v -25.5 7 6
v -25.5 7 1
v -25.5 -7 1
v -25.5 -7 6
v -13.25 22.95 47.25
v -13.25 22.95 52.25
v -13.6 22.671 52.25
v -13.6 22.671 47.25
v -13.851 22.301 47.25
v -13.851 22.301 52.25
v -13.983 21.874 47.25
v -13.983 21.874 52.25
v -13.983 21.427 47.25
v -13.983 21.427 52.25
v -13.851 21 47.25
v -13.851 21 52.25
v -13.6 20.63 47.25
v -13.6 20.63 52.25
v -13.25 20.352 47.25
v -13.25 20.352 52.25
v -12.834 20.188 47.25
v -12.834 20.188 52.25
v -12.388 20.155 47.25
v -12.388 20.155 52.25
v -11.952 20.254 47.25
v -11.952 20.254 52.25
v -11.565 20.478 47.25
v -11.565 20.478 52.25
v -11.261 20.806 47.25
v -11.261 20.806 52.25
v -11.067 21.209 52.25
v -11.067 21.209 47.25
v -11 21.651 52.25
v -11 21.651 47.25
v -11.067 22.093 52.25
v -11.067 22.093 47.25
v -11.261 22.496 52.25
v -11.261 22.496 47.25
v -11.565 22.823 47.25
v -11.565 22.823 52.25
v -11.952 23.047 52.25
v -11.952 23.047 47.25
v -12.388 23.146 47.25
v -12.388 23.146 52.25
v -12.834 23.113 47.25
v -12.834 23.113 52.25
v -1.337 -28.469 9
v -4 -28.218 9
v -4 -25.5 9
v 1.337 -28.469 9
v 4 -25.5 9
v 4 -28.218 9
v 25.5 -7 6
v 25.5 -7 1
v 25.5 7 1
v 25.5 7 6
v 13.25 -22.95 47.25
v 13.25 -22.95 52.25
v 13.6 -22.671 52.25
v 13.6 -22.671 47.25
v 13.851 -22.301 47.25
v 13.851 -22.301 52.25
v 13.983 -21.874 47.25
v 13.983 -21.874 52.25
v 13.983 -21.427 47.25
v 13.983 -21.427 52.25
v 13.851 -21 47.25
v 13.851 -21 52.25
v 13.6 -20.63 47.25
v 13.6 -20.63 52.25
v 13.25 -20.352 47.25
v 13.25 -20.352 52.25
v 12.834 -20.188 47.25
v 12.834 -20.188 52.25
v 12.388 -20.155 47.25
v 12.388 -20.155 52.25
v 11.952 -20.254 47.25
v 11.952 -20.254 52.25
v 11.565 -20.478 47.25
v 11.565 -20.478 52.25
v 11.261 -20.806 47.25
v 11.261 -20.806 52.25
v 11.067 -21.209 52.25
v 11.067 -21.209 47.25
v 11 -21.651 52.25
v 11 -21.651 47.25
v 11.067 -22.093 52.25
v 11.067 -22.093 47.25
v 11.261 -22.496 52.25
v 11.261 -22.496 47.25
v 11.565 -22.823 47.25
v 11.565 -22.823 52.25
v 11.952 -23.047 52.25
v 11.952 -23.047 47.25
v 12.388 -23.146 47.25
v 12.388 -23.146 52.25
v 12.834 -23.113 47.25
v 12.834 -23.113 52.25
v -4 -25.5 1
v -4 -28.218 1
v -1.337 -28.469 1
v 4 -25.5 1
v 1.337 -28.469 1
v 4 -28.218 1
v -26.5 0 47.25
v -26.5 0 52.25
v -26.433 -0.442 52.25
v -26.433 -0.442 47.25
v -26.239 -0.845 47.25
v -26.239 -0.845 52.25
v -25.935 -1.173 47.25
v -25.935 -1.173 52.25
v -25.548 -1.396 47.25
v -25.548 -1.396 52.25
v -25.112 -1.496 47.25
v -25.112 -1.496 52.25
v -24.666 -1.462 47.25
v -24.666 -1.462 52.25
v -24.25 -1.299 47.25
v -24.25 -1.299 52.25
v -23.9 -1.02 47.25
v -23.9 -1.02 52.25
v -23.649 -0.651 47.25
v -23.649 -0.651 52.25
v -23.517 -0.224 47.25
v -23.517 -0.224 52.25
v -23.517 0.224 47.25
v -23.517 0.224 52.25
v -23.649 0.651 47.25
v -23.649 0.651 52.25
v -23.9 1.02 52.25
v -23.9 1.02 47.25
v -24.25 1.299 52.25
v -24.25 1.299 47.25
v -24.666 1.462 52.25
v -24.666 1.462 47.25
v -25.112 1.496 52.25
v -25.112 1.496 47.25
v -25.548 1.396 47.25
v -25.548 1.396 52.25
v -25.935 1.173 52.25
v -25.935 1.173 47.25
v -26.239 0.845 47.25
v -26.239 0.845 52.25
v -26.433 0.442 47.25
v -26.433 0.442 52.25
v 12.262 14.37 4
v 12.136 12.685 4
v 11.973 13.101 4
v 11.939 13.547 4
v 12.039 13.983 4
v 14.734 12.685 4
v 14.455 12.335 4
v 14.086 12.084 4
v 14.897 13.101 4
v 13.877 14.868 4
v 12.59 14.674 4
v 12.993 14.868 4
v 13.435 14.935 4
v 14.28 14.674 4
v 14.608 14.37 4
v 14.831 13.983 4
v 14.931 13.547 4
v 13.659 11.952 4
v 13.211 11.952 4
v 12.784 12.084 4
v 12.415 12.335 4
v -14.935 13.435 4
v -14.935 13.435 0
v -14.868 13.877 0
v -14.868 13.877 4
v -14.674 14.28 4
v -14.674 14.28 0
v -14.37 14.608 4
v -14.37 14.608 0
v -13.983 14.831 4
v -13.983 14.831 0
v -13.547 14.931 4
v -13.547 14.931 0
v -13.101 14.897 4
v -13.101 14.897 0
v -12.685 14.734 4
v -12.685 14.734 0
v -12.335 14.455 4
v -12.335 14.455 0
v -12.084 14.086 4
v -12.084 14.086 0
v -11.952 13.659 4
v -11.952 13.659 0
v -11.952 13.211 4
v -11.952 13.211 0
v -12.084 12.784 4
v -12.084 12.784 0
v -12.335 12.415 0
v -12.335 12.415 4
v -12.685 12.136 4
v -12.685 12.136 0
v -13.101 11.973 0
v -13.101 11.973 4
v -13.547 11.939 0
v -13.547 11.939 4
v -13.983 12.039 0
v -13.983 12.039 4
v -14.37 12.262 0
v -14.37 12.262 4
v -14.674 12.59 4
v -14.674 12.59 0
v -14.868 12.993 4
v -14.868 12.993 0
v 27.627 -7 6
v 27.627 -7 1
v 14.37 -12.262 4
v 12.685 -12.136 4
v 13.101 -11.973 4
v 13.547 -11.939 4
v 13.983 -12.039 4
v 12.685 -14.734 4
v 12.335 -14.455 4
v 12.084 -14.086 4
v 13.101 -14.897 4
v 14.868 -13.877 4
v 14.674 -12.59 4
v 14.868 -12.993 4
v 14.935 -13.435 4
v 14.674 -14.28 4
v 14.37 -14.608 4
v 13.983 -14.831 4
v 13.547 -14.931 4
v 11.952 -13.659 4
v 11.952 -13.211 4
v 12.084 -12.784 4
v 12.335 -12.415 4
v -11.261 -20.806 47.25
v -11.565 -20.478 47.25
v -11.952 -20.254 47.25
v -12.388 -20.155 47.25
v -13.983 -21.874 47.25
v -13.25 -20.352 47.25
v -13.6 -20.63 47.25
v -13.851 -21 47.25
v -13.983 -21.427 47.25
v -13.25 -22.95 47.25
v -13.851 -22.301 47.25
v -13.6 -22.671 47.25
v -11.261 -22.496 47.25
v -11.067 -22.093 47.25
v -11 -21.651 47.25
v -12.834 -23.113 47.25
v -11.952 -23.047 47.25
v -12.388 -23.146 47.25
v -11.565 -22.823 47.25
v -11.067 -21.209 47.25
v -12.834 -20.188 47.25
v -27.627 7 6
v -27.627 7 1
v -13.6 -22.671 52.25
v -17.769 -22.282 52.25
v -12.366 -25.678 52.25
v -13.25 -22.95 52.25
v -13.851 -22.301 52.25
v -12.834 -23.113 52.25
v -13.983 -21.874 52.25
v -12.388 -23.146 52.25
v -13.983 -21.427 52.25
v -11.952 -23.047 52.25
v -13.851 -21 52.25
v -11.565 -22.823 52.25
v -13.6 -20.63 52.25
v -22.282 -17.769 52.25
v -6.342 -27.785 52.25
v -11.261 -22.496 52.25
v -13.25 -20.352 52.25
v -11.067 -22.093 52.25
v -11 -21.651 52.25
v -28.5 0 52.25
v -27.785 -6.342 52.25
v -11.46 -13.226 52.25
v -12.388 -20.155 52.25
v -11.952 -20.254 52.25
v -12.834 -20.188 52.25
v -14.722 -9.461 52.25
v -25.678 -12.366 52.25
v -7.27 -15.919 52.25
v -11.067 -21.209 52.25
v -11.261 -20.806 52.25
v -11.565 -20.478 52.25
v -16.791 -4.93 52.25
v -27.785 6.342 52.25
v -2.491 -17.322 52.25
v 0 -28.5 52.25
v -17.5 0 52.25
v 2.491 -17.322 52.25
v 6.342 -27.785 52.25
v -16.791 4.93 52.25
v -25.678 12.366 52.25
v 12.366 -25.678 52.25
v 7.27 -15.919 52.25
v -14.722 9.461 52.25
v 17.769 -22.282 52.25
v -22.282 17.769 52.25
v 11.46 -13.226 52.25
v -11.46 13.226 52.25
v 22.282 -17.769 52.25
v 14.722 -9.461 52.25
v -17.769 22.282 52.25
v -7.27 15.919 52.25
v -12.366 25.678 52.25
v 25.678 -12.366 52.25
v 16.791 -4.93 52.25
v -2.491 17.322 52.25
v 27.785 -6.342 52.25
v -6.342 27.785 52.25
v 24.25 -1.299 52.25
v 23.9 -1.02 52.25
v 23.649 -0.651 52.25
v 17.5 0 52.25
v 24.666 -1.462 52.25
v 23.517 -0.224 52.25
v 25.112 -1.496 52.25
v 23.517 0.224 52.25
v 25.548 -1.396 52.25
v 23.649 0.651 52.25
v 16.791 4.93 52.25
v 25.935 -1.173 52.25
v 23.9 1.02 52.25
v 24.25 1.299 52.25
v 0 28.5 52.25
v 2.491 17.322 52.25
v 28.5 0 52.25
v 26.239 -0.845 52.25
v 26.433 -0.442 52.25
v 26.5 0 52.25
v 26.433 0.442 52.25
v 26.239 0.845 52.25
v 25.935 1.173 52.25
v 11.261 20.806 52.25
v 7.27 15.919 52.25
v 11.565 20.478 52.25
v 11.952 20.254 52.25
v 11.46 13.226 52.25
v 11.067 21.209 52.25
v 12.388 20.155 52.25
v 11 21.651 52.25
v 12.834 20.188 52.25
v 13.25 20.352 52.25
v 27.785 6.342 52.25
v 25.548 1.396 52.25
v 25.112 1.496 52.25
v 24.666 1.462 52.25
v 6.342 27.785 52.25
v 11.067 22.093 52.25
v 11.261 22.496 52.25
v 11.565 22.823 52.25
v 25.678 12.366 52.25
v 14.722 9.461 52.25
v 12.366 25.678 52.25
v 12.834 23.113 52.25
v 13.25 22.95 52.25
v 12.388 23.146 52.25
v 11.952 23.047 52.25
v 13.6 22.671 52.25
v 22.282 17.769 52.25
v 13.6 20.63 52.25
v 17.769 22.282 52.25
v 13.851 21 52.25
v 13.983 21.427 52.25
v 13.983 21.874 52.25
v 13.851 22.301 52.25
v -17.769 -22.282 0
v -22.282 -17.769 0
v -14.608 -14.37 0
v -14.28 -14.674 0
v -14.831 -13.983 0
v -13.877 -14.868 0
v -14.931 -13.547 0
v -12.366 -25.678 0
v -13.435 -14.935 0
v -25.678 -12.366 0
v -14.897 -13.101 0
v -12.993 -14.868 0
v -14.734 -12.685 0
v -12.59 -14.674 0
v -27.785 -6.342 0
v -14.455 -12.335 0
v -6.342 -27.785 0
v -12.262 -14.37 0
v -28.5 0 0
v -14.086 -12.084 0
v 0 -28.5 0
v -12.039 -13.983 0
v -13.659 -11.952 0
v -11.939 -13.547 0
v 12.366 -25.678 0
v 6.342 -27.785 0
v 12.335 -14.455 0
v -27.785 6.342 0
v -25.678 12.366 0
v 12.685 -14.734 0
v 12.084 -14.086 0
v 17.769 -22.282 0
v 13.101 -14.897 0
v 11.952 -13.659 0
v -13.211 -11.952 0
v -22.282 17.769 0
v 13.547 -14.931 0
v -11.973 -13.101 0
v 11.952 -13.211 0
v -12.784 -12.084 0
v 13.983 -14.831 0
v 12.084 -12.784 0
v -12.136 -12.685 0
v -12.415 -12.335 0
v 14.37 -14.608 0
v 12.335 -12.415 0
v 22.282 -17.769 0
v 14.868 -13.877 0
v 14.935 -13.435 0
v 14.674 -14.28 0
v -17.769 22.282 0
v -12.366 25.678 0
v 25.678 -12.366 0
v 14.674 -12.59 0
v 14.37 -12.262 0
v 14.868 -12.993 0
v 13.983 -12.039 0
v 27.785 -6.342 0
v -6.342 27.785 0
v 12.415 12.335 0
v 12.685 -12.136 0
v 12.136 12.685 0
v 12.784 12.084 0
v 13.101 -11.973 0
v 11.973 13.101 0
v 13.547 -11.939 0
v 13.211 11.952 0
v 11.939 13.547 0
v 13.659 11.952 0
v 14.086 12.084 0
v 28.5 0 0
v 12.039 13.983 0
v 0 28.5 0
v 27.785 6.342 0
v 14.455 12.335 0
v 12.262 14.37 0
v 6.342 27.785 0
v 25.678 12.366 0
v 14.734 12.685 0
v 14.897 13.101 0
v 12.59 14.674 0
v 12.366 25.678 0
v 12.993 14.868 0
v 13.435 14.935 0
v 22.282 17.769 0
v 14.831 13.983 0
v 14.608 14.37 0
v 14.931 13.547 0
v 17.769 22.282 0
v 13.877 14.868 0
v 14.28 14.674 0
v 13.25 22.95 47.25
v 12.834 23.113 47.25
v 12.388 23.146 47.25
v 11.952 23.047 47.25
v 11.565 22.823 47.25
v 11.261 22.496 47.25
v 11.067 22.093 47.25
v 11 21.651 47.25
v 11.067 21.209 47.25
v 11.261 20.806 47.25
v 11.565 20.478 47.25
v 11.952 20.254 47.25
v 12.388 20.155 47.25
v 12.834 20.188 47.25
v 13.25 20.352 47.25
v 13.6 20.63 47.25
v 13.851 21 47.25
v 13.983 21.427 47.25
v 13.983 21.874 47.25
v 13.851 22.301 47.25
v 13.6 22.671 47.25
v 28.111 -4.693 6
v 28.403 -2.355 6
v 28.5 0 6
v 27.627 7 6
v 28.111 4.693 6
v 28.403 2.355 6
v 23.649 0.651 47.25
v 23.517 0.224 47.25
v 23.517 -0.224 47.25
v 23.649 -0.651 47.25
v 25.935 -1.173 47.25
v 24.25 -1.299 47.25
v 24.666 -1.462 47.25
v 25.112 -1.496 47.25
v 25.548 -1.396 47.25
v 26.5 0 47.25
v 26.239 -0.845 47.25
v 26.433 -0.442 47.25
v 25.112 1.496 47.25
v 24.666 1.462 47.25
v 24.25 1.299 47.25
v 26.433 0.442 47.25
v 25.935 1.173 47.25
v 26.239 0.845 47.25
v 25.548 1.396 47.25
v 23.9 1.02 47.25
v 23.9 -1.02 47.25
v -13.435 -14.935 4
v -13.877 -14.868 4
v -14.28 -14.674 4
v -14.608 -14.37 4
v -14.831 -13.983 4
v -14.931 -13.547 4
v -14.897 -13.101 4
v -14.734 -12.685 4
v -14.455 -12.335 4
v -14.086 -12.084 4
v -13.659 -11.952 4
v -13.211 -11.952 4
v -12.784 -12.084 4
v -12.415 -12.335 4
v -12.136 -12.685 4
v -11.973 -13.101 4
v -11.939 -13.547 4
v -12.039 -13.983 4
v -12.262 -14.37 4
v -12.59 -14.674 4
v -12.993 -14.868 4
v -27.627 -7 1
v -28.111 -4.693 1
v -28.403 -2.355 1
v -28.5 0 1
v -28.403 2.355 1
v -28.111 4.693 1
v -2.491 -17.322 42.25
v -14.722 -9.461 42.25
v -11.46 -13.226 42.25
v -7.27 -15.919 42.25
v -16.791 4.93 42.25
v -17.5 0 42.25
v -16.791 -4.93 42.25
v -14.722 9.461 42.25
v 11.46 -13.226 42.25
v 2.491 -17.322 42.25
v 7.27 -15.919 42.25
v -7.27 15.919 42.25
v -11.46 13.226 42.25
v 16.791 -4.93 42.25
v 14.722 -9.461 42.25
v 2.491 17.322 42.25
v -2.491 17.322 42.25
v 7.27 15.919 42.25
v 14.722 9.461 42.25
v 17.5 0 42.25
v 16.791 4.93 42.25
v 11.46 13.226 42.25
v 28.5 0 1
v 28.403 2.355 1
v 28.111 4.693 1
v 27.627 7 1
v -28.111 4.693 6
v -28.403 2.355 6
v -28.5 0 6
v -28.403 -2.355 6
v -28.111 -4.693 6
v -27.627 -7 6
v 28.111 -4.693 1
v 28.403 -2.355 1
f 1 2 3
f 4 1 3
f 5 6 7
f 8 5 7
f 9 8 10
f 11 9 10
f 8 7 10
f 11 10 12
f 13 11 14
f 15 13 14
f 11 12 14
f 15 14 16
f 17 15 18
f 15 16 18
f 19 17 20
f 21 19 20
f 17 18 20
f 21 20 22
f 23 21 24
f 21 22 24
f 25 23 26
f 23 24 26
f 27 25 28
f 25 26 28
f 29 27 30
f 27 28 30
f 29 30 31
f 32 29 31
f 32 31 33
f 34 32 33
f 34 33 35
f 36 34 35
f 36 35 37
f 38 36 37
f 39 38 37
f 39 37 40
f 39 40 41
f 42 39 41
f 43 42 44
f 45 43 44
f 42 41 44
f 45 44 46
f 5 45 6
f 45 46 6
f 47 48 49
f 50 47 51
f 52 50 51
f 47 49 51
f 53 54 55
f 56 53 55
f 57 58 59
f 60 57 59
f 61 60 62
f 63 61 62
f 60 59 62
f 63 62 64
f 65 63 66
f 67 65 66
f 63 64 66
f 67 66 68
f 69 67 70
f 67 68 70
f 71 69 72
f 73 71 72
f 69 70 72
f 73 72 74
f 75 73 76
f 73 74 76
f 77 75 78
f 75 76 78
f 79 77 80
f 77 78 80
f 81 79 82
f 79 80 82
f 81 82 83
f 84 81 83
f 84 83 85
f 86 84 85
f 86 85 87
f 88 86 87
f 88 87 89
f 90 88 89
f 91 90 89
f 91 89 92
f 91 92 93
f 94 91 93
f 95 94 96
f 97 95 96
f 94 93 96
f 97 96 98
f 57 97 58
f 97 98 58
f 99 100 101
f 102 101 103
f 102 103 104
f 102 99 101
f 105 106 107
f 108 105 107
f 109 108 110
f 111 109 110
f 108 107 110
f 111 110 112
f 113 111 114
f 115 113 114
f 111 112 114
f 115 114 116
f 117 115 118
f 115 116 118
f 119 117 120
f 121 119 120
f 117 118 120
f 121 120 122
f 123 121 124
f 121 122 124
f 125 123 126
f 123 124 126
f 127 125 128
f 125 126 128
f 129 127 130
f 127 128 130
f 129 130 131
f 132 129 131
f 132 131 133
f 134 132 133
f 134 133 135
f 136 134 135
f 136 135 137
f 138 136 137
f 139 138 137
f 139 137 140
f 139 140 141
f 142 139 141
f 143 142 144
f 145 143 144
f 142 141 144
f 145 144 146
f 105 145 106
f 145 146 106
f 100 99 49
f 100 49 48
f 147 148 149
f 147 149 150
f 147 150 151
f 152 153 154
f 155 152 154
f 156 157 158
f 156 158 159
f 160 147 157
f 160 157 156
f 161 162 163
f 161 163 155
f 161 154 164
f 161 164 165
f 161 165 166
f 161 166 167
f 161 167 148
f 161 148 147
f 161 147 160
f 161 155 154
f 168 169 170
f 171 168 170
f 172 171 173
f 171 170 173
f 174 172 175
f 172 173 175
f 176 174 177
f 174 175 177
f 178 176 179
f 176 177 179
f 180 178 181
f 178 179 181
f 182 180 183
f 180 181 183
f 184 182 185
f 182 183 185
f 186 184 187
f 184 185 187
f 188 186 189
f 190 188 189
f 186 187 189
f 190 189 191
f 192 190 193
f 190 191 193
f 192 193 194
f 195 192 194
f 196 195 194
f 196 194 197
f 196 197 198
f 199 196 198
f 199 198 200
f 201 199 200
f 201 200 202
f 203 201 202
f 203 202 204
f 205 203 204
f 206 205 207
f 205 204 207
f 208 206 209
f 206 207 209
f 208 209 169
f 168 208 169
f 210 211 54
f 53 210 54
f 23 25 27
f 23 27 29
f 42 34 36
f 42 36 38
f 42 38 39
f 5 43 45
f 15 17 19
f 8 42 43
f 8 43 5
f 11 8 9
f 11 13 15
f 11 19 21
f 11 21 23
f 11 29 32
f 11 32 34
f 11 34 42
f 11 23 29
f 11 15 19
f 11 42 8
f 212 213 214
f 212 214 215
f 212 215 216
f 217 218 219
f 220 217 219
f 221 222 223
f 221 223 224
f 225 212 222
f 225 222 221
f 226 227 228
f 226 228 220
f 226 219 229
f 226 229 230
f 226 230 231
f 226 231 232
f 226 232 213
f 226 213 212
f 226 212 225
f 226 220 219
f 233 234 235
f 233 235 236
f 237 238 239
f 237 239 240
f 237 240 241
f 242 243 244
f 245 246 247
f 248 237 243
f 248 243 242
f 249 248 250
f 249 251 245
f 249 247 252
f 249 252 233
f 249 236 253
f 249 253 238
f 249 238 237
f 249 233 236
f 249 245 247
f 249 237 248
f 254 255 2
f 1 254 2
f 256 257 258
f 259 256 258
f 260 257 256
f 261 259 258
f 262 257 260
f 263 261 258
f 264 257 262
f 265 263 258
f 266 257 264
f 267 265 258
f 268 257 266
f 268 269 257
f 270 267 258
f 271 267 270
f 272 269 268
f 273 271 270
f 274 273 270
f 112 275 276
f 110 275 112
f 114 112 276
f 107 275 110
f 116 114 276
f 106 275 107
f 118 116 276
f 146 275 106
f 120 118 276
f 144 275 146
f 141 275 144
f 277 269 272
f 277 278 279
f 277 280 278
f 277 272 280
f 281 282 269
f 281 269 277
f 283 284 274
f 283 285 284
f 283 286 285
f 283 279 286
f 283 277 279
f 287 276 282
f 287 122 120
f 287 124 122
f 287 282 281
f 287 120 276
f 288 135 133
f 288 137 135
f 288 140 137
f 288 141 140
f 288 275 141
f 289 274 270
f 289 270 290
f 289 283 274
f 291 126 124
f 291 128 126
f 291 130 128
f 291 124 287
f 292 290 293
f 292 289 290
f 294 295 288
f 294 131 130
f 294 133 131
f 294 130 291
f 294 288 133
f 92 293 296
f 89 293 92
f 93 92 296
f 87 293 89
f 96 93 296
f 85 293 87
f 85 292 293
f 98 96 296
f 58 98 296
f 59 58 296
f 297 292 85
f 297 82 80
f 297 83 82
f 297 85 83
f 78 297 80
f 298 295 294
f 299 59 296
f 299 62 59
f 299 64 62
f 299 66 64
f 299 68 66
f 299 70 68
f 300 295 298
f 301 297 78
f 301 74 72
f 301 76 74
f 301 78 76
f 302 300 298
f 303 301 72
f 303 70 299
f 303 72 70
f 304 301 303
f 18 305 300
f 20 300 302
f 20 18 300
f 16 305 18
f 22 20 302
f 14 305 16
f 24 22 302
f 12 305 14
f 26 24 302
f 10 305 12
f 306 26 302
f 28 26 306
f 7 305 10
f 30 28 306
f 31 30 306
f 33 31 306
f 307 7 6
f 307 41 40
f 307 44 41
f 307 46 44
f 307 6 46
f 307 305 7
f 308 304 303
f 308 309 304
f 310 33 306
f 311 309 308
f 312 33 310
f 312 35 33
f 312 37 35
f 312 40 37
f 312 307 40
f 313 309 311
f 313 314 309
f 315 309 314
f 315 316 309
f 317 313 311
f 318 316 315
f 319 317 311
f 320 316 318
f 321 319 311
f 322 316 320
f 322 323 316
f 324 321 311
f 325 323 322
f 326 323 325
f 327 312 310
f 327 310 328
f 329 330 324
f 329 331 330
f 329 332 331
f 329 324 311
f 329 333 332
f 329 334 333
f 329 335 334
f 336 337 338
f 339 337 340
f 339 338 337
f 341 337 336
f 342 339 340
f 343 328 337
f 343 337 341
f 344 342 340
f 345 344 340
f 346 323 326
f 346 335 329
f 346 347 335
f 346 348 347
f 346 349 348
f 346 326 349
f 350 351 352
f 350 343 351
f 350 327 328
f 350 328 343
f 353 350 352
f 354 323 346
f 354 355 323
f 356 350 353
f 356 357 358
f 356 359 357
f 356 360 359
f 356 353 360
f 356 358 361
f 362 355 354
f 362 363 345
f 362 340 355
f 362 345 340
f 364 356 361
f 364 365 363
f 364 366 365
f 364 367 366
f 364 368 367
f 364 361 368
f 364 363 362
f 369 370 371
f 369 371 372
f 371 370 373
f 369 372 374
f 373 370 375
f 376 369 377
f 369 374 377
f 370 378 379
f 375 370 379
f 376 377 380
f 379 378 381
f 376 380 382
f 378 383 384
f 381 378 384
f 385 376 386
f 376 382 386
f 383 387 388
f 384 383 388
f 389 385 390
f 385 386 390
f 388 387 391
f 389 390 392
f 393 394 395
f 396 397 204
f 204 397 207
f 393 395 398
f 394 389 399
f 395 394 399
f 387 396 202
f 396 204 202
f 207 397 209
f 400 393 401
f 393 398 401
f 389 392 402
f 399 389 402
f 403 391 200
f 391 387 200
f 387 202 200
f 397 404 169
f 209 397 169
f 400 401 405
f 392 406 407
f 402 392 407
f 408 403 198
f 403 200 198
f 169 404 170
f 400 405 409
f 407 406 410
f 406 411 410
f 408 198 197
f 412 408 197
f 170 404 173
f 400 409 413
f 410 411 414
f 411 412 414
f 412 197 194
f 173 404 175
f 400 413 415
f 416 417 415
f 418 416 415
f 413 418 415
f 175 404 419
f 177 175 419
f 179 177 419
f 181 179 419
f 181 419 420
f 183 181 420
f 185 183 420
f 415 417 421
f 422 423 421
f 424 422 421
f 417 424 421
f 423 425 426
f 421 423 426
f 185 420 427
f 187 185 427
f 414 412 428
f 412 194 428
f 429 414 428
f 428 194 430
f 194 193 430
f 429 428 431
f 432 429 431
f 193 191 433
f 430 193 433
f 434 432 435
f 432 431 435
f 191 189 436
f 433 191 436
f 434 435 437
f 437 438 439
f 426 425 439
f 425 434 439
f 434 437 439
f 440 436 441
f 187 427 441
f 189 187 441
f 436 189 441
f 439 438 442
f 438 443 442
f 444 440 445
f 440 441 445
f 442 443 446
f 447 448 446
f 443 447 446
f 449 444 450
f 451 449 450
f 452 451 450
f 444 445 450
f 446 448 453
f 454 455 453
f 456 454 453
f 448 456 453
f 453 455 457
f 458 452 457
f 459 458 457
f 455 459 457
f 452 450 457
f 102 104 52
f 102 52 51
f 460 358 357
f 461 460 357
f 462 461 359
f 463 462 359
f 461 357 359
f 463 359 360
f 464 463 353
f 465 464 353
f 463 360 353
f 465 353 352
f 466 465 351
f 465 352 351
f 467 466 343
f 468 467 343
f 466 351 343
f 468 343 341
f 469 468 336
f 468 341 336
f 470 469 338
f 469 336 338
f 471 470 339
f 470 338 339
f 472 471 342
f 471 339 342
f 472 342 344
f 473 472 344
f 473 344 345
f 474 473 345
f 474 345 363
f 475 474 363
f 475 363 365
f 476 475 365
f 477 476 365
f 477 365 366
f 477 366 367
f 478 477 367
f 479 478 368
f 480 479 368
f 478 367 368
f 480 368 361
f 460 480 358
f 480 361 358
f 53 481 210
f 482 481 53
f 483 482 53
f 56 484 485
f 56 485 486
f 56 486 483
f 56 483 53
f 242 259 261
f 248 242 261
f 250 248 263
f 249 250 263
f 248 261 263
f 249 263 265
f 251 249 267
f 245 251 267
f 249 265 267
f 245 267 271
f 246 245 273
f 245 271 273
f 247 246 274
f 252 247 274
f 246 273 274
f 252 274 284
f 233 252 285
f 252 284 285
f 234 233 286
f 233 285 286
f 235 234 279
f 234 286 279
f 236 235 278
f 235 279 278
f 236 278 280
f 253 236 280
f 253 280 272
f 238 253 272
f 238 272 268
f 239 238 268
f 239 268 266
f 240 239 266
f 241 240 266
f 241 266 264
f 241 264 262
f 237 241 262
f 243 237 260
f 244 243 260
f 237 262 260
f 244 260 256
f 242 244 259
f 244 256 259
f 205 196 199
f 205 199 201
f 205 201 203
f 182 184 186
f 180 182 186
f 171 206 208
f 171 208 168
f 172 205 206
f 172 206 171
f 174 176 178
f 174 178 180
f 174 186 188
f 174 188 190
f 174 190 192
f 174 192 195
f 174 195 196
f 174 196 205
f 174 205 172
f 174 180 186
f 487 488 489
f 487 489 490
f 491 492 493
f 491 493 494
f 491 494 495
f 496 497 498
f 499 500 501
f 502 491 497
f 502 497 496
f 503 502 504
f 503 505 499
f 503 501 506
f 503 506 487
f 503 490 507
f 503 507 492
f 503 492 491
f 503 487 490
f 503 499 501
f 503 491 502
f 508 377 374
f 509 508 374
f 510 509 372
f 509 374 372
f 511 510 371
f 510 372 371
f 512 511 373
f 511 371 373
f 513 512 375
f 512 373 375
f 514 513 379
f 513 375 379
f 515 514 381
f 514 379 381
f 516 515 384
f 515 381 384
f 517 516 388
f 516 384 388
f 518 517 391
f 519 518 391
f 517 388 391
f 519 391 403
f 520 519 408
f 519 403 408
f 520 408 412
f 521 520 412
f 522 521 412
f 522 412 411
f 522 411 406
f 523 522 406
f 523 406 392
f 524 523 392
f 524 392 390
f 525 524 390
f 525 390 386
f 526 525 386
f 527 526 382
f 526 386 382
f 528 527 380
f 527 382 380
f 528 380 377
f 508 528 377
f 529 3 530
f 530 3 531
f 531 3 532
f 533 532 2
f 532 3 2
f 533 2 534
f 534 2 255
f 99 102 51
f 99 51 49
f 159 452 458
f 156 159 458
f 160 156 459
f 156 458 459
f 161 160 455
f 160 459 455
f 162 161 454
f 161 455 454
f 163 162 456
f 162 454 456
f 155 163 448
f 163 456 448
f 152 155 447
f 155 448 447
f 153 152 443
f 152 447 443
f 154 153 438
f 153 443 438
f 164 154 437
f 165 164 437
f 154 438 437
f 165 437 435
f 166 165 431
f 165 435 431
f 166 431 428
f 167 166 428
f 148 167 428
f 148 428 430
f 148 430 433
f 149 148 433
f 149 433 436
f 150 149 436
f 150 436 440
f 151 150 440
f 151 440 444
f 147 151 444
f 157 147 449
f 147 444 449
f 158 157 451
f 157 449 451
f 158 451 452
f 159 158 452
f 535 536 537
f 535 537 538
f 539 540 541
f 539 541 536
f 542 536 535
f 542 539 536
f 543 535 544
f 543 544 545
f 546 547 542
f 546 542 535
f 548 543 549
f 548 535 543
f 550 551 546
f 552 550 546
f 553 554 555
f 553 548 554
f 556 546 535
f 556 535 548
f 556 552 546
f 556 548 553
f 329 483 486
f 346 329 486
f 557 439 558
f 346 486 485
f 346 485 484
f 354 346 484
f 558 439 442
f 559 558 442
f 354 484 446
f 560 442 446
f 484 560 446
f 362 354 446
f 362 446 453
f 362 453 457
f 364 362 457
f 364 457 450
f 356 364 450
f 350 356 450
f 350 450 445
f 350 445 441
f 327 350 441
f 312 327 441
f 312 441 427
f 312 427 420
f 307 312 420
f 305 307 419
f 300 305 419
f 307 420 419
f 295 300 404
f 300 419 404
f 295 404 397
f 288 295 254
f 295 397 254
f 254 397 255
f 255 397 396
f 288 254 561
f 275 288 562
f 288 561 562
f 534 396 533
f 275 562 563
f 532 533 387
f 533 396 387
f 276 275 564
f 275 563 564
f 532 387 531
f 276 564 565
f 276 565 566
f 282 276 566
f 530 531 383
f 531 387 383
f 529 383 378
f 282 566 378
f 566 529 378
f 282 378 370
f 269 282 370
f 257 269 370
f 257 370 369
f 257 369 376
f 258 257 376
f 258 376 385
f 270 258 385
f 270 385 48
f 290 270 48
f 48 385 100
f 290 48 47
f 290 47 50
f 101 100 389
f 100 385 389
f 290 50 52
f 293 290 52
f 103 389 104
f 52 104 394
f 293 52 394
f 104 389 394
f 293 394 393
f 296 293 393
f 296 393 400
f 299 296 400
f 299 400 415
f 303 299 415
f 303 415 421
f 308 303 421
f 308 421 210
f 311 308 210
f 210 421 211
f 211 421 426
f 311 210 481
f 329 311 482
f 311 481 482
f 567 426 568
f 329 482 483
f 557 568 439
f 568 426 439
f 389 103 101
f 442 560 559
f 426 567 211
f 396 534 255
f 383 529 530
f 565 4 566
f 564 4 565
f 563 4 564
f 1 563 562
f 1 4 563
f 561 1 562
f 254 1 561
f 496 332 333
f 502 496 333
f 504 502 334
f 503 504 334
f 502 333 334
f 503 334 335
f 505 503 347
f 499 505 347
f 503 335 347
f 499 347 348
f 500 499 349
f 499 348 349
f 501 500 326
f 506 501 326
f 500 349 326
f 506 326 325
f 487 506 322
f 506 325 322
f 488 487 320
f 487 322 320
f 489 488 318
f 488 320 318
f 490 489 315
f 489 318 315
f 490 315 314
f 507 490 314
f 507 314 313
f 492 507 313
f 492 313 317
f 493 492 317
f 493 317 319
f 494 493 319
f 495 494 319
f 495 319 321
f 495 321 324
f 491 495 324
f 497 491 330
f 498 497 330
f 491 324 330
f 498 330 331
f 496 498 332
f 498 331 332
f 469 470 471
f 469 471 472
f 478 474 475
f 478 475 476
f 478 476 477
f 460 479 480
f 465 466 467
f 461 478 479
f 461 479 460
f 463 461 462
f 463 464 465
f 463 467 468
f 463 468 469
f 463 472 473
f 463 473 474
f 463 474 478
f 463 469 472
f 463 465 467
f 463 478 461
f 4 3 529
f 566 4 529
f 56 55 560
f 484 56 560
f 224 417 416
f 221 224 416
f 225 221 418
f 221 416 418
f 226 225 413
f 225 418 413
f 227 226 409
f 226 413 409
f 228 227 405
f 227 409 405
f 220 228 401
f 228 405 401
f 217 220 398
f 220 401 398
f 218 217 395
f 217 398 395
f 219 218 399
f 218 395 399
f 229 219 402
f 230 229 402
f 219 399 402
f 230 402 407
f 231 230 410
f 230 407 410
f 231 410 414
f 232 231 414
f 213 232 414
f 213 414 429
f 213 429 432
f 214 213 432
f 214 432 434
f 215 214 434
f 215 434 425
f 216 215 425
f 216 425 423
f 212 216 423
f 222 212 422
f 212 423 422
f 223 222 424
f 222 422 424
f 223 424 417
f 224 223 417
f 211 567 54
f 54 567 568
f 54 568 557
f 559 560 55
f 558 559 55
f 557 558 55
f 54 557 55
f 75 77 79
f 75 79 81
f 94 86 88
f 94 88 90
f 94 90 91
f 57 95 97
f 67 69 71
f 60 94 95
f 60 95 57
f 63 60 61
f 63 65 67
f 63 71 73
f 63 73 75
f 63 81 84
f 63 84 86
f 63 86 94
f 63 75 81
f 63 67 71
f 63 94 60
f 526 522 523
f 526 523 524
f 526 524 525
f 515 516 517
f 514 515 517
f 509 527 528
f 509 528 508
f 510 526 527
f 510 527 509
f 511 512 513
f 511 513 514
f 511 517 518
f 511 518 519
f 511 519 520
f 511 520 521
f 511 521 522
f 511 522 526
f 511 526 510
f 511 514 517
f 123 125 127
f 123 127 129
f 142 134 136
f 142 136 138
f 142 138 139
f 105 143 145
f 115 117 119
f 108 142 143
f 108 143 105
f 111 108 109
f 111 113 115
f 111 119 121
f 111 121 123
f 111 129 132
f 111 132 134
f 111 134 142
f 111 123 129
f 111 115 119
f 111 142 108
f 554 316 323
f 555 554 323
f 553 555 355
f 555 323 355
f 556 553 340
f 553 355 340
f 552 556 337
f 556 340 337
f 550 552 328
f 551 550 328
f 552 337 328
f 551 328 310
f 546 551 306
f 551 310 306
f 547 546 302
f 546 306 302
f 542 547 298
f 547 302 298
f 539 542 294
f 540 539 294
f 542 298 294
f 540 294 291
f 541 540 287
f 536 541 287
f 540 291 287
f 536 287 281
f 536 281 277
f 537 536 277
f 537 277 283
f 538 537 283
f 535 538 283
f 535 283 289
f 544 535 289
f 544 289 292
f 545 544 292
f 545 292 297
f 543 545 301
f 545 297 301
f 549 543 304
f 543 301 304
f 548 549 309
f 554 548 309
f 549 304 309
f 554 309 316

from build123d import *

# Parameters (mm, degrees)
SKETCH_1_R               = 28.5
EXTRUDE_1_DEPTH          = 52.25
SKETCH_2_R               = 1.5
CUT_EXTRUDE_1_DEPTH      = 5
PATTERN_CIRCULAR_1_COUNT = 6
SKETCH_3_R               = 17.5
CUT_EXTRUDE_2_DEPTH      = 10
CUT_EXTRUDE_START        = -1
CUT_EXTRUDE_5_DEPTH      = 5
CUT_EXTRUDE_6_DEPTH      = 8
SKETCH_8_R               = 1.5
CUT_EXTRUDE_8_DEPTH      = 4
PATTERN_CIRCULAR_2_COUNT = 4


with BuildPart() as part:
    # 草图1 → 凸台-拉伸1 (new body)
    with BuildSketch(Plane.XY):
        Circle(SKETCH_1_R)
    extrude(amount=EXTRUDE_1_DEPTH)

    # 草图2 → 切除-拉伸1 (cut)
    with BuildSketch(Plane.XY.offset(52.25)):
        with Locations((25, 0)):
            Circle(SKETCH_2_R)
    cut_extrude_1 = extrude(amount=-CUT_EXTRUDE_1_DEPTH, mode=Mode.SUBTRACT)

    # 阵列(圆周)1: 切除-拉伸1 ×6 about axis
    pattern_circular_1_axis = Axis((0, 0, 0), (0, 0, 1))
    for i in range(1, PATTERN_CIRCULAR_1_COUNT):
        add(cut_extrude_1.rotate(pattern_circular_1_axis, i * 360 / PATTERN_CIRCULAR_1_COUNT), mode=Mode.SUBTRACT)

    # 草图3 → 切除-拉伸2 (cut)
    with BuildSketch(Plane.XY.offset(52.25)):
        Circle(SKETCH_3_R)
    extrude(amount=-CUT_EXTRUDE_2_DEPTH, mode=Mode.SUBTRACT)

    # 草图5 → 切除-拉伸5 (cut)
    with BuildSketch(Plane(origin=(0, 0, 0), x_dir=(-1, 0, 0), z_dir=(0, 0, -1)).offset(CUT_EXTRUDE_START)):
        with BuildLine():
            ThreePointArc((28.5, 0), (28.280902723, 3.527115134), (27.626979567, 7))
            Line((27.626979567, 7), (25.5, 7))
            Line((25.5, 7), (25.5, -7))
            Line((25.5, -7), (27.626979567, -7))
            ThreePointArc((27.626979567, -7), (28.280902723, -3.527115134), (28.5, 0))
        make_face()
        with BuildLine():
            Line((-25.5, 7), (-27.626979567, 7))
            ThreePointArc((-27.626979567, 7), (-28.5, 0), (-27.626979567, -7))
            Line((-27.626979567, -7), (-25.5, -7))
            Line((-25.5, -7), (-25.5, 7))
        make_face()
    extrude(amount=-CUT_EXTRUDE_5_DEPTH, mode=Mode.SUBTRACT)

    # 草图7 → 切除-拉伸6 (cut)
    with BuildSketch(Plane(origin=(0, 0, 0), x_dir=(-1, 0, 0), z_dir=(0, 0, -1)).offset(CUT_EXTRUDE_START)):
        with BuildLine():
            Line((-4, -28.217902119), (-4, -25.5))
            Line((-4, -25.5), (4, -25.5))
            Line((4, -25.5), (4, -28.217902119))
            ThreePointArc((4, -28.217902119), (0, -28.5), (-4, -28.217902119))
        make_face()
    extrude(amount=-CUT_EXTRUDE_6_DEPTH, mode=Mode.SUBTRACT)

    # 草图8 → 切除-拉伸8 (cut)
    with BuildSketch(Plane(origin=(0, 0, 0), x_dir=(-1, 0, 0), z_dir=(0, 0, -1))):
        with Locations((13.435028843, 13.435028843)):
            Circle(SKETCH_8_R)
    cut_extrude_8 = extrude(amount=-CUT_EXTRUDE_8_DEPTH, mode=Mode.SUBTRACT)

    # 阵列(圆周)2: 切除-拉伸8 ×4 about axis
    pattern_circular_2_axis = Axis((0, 0, 0), (0, 0, 1))
    for i in range(1, PATTERN_CIRCULAR_2_COUNT):
        add(cut_extrude_8.rotate(pattern_circular_2_axis, i * 360 / PATTERN_CIRCULAR_2_COUNT), mode=Mode.SUBTRACT)


solid = part.part
